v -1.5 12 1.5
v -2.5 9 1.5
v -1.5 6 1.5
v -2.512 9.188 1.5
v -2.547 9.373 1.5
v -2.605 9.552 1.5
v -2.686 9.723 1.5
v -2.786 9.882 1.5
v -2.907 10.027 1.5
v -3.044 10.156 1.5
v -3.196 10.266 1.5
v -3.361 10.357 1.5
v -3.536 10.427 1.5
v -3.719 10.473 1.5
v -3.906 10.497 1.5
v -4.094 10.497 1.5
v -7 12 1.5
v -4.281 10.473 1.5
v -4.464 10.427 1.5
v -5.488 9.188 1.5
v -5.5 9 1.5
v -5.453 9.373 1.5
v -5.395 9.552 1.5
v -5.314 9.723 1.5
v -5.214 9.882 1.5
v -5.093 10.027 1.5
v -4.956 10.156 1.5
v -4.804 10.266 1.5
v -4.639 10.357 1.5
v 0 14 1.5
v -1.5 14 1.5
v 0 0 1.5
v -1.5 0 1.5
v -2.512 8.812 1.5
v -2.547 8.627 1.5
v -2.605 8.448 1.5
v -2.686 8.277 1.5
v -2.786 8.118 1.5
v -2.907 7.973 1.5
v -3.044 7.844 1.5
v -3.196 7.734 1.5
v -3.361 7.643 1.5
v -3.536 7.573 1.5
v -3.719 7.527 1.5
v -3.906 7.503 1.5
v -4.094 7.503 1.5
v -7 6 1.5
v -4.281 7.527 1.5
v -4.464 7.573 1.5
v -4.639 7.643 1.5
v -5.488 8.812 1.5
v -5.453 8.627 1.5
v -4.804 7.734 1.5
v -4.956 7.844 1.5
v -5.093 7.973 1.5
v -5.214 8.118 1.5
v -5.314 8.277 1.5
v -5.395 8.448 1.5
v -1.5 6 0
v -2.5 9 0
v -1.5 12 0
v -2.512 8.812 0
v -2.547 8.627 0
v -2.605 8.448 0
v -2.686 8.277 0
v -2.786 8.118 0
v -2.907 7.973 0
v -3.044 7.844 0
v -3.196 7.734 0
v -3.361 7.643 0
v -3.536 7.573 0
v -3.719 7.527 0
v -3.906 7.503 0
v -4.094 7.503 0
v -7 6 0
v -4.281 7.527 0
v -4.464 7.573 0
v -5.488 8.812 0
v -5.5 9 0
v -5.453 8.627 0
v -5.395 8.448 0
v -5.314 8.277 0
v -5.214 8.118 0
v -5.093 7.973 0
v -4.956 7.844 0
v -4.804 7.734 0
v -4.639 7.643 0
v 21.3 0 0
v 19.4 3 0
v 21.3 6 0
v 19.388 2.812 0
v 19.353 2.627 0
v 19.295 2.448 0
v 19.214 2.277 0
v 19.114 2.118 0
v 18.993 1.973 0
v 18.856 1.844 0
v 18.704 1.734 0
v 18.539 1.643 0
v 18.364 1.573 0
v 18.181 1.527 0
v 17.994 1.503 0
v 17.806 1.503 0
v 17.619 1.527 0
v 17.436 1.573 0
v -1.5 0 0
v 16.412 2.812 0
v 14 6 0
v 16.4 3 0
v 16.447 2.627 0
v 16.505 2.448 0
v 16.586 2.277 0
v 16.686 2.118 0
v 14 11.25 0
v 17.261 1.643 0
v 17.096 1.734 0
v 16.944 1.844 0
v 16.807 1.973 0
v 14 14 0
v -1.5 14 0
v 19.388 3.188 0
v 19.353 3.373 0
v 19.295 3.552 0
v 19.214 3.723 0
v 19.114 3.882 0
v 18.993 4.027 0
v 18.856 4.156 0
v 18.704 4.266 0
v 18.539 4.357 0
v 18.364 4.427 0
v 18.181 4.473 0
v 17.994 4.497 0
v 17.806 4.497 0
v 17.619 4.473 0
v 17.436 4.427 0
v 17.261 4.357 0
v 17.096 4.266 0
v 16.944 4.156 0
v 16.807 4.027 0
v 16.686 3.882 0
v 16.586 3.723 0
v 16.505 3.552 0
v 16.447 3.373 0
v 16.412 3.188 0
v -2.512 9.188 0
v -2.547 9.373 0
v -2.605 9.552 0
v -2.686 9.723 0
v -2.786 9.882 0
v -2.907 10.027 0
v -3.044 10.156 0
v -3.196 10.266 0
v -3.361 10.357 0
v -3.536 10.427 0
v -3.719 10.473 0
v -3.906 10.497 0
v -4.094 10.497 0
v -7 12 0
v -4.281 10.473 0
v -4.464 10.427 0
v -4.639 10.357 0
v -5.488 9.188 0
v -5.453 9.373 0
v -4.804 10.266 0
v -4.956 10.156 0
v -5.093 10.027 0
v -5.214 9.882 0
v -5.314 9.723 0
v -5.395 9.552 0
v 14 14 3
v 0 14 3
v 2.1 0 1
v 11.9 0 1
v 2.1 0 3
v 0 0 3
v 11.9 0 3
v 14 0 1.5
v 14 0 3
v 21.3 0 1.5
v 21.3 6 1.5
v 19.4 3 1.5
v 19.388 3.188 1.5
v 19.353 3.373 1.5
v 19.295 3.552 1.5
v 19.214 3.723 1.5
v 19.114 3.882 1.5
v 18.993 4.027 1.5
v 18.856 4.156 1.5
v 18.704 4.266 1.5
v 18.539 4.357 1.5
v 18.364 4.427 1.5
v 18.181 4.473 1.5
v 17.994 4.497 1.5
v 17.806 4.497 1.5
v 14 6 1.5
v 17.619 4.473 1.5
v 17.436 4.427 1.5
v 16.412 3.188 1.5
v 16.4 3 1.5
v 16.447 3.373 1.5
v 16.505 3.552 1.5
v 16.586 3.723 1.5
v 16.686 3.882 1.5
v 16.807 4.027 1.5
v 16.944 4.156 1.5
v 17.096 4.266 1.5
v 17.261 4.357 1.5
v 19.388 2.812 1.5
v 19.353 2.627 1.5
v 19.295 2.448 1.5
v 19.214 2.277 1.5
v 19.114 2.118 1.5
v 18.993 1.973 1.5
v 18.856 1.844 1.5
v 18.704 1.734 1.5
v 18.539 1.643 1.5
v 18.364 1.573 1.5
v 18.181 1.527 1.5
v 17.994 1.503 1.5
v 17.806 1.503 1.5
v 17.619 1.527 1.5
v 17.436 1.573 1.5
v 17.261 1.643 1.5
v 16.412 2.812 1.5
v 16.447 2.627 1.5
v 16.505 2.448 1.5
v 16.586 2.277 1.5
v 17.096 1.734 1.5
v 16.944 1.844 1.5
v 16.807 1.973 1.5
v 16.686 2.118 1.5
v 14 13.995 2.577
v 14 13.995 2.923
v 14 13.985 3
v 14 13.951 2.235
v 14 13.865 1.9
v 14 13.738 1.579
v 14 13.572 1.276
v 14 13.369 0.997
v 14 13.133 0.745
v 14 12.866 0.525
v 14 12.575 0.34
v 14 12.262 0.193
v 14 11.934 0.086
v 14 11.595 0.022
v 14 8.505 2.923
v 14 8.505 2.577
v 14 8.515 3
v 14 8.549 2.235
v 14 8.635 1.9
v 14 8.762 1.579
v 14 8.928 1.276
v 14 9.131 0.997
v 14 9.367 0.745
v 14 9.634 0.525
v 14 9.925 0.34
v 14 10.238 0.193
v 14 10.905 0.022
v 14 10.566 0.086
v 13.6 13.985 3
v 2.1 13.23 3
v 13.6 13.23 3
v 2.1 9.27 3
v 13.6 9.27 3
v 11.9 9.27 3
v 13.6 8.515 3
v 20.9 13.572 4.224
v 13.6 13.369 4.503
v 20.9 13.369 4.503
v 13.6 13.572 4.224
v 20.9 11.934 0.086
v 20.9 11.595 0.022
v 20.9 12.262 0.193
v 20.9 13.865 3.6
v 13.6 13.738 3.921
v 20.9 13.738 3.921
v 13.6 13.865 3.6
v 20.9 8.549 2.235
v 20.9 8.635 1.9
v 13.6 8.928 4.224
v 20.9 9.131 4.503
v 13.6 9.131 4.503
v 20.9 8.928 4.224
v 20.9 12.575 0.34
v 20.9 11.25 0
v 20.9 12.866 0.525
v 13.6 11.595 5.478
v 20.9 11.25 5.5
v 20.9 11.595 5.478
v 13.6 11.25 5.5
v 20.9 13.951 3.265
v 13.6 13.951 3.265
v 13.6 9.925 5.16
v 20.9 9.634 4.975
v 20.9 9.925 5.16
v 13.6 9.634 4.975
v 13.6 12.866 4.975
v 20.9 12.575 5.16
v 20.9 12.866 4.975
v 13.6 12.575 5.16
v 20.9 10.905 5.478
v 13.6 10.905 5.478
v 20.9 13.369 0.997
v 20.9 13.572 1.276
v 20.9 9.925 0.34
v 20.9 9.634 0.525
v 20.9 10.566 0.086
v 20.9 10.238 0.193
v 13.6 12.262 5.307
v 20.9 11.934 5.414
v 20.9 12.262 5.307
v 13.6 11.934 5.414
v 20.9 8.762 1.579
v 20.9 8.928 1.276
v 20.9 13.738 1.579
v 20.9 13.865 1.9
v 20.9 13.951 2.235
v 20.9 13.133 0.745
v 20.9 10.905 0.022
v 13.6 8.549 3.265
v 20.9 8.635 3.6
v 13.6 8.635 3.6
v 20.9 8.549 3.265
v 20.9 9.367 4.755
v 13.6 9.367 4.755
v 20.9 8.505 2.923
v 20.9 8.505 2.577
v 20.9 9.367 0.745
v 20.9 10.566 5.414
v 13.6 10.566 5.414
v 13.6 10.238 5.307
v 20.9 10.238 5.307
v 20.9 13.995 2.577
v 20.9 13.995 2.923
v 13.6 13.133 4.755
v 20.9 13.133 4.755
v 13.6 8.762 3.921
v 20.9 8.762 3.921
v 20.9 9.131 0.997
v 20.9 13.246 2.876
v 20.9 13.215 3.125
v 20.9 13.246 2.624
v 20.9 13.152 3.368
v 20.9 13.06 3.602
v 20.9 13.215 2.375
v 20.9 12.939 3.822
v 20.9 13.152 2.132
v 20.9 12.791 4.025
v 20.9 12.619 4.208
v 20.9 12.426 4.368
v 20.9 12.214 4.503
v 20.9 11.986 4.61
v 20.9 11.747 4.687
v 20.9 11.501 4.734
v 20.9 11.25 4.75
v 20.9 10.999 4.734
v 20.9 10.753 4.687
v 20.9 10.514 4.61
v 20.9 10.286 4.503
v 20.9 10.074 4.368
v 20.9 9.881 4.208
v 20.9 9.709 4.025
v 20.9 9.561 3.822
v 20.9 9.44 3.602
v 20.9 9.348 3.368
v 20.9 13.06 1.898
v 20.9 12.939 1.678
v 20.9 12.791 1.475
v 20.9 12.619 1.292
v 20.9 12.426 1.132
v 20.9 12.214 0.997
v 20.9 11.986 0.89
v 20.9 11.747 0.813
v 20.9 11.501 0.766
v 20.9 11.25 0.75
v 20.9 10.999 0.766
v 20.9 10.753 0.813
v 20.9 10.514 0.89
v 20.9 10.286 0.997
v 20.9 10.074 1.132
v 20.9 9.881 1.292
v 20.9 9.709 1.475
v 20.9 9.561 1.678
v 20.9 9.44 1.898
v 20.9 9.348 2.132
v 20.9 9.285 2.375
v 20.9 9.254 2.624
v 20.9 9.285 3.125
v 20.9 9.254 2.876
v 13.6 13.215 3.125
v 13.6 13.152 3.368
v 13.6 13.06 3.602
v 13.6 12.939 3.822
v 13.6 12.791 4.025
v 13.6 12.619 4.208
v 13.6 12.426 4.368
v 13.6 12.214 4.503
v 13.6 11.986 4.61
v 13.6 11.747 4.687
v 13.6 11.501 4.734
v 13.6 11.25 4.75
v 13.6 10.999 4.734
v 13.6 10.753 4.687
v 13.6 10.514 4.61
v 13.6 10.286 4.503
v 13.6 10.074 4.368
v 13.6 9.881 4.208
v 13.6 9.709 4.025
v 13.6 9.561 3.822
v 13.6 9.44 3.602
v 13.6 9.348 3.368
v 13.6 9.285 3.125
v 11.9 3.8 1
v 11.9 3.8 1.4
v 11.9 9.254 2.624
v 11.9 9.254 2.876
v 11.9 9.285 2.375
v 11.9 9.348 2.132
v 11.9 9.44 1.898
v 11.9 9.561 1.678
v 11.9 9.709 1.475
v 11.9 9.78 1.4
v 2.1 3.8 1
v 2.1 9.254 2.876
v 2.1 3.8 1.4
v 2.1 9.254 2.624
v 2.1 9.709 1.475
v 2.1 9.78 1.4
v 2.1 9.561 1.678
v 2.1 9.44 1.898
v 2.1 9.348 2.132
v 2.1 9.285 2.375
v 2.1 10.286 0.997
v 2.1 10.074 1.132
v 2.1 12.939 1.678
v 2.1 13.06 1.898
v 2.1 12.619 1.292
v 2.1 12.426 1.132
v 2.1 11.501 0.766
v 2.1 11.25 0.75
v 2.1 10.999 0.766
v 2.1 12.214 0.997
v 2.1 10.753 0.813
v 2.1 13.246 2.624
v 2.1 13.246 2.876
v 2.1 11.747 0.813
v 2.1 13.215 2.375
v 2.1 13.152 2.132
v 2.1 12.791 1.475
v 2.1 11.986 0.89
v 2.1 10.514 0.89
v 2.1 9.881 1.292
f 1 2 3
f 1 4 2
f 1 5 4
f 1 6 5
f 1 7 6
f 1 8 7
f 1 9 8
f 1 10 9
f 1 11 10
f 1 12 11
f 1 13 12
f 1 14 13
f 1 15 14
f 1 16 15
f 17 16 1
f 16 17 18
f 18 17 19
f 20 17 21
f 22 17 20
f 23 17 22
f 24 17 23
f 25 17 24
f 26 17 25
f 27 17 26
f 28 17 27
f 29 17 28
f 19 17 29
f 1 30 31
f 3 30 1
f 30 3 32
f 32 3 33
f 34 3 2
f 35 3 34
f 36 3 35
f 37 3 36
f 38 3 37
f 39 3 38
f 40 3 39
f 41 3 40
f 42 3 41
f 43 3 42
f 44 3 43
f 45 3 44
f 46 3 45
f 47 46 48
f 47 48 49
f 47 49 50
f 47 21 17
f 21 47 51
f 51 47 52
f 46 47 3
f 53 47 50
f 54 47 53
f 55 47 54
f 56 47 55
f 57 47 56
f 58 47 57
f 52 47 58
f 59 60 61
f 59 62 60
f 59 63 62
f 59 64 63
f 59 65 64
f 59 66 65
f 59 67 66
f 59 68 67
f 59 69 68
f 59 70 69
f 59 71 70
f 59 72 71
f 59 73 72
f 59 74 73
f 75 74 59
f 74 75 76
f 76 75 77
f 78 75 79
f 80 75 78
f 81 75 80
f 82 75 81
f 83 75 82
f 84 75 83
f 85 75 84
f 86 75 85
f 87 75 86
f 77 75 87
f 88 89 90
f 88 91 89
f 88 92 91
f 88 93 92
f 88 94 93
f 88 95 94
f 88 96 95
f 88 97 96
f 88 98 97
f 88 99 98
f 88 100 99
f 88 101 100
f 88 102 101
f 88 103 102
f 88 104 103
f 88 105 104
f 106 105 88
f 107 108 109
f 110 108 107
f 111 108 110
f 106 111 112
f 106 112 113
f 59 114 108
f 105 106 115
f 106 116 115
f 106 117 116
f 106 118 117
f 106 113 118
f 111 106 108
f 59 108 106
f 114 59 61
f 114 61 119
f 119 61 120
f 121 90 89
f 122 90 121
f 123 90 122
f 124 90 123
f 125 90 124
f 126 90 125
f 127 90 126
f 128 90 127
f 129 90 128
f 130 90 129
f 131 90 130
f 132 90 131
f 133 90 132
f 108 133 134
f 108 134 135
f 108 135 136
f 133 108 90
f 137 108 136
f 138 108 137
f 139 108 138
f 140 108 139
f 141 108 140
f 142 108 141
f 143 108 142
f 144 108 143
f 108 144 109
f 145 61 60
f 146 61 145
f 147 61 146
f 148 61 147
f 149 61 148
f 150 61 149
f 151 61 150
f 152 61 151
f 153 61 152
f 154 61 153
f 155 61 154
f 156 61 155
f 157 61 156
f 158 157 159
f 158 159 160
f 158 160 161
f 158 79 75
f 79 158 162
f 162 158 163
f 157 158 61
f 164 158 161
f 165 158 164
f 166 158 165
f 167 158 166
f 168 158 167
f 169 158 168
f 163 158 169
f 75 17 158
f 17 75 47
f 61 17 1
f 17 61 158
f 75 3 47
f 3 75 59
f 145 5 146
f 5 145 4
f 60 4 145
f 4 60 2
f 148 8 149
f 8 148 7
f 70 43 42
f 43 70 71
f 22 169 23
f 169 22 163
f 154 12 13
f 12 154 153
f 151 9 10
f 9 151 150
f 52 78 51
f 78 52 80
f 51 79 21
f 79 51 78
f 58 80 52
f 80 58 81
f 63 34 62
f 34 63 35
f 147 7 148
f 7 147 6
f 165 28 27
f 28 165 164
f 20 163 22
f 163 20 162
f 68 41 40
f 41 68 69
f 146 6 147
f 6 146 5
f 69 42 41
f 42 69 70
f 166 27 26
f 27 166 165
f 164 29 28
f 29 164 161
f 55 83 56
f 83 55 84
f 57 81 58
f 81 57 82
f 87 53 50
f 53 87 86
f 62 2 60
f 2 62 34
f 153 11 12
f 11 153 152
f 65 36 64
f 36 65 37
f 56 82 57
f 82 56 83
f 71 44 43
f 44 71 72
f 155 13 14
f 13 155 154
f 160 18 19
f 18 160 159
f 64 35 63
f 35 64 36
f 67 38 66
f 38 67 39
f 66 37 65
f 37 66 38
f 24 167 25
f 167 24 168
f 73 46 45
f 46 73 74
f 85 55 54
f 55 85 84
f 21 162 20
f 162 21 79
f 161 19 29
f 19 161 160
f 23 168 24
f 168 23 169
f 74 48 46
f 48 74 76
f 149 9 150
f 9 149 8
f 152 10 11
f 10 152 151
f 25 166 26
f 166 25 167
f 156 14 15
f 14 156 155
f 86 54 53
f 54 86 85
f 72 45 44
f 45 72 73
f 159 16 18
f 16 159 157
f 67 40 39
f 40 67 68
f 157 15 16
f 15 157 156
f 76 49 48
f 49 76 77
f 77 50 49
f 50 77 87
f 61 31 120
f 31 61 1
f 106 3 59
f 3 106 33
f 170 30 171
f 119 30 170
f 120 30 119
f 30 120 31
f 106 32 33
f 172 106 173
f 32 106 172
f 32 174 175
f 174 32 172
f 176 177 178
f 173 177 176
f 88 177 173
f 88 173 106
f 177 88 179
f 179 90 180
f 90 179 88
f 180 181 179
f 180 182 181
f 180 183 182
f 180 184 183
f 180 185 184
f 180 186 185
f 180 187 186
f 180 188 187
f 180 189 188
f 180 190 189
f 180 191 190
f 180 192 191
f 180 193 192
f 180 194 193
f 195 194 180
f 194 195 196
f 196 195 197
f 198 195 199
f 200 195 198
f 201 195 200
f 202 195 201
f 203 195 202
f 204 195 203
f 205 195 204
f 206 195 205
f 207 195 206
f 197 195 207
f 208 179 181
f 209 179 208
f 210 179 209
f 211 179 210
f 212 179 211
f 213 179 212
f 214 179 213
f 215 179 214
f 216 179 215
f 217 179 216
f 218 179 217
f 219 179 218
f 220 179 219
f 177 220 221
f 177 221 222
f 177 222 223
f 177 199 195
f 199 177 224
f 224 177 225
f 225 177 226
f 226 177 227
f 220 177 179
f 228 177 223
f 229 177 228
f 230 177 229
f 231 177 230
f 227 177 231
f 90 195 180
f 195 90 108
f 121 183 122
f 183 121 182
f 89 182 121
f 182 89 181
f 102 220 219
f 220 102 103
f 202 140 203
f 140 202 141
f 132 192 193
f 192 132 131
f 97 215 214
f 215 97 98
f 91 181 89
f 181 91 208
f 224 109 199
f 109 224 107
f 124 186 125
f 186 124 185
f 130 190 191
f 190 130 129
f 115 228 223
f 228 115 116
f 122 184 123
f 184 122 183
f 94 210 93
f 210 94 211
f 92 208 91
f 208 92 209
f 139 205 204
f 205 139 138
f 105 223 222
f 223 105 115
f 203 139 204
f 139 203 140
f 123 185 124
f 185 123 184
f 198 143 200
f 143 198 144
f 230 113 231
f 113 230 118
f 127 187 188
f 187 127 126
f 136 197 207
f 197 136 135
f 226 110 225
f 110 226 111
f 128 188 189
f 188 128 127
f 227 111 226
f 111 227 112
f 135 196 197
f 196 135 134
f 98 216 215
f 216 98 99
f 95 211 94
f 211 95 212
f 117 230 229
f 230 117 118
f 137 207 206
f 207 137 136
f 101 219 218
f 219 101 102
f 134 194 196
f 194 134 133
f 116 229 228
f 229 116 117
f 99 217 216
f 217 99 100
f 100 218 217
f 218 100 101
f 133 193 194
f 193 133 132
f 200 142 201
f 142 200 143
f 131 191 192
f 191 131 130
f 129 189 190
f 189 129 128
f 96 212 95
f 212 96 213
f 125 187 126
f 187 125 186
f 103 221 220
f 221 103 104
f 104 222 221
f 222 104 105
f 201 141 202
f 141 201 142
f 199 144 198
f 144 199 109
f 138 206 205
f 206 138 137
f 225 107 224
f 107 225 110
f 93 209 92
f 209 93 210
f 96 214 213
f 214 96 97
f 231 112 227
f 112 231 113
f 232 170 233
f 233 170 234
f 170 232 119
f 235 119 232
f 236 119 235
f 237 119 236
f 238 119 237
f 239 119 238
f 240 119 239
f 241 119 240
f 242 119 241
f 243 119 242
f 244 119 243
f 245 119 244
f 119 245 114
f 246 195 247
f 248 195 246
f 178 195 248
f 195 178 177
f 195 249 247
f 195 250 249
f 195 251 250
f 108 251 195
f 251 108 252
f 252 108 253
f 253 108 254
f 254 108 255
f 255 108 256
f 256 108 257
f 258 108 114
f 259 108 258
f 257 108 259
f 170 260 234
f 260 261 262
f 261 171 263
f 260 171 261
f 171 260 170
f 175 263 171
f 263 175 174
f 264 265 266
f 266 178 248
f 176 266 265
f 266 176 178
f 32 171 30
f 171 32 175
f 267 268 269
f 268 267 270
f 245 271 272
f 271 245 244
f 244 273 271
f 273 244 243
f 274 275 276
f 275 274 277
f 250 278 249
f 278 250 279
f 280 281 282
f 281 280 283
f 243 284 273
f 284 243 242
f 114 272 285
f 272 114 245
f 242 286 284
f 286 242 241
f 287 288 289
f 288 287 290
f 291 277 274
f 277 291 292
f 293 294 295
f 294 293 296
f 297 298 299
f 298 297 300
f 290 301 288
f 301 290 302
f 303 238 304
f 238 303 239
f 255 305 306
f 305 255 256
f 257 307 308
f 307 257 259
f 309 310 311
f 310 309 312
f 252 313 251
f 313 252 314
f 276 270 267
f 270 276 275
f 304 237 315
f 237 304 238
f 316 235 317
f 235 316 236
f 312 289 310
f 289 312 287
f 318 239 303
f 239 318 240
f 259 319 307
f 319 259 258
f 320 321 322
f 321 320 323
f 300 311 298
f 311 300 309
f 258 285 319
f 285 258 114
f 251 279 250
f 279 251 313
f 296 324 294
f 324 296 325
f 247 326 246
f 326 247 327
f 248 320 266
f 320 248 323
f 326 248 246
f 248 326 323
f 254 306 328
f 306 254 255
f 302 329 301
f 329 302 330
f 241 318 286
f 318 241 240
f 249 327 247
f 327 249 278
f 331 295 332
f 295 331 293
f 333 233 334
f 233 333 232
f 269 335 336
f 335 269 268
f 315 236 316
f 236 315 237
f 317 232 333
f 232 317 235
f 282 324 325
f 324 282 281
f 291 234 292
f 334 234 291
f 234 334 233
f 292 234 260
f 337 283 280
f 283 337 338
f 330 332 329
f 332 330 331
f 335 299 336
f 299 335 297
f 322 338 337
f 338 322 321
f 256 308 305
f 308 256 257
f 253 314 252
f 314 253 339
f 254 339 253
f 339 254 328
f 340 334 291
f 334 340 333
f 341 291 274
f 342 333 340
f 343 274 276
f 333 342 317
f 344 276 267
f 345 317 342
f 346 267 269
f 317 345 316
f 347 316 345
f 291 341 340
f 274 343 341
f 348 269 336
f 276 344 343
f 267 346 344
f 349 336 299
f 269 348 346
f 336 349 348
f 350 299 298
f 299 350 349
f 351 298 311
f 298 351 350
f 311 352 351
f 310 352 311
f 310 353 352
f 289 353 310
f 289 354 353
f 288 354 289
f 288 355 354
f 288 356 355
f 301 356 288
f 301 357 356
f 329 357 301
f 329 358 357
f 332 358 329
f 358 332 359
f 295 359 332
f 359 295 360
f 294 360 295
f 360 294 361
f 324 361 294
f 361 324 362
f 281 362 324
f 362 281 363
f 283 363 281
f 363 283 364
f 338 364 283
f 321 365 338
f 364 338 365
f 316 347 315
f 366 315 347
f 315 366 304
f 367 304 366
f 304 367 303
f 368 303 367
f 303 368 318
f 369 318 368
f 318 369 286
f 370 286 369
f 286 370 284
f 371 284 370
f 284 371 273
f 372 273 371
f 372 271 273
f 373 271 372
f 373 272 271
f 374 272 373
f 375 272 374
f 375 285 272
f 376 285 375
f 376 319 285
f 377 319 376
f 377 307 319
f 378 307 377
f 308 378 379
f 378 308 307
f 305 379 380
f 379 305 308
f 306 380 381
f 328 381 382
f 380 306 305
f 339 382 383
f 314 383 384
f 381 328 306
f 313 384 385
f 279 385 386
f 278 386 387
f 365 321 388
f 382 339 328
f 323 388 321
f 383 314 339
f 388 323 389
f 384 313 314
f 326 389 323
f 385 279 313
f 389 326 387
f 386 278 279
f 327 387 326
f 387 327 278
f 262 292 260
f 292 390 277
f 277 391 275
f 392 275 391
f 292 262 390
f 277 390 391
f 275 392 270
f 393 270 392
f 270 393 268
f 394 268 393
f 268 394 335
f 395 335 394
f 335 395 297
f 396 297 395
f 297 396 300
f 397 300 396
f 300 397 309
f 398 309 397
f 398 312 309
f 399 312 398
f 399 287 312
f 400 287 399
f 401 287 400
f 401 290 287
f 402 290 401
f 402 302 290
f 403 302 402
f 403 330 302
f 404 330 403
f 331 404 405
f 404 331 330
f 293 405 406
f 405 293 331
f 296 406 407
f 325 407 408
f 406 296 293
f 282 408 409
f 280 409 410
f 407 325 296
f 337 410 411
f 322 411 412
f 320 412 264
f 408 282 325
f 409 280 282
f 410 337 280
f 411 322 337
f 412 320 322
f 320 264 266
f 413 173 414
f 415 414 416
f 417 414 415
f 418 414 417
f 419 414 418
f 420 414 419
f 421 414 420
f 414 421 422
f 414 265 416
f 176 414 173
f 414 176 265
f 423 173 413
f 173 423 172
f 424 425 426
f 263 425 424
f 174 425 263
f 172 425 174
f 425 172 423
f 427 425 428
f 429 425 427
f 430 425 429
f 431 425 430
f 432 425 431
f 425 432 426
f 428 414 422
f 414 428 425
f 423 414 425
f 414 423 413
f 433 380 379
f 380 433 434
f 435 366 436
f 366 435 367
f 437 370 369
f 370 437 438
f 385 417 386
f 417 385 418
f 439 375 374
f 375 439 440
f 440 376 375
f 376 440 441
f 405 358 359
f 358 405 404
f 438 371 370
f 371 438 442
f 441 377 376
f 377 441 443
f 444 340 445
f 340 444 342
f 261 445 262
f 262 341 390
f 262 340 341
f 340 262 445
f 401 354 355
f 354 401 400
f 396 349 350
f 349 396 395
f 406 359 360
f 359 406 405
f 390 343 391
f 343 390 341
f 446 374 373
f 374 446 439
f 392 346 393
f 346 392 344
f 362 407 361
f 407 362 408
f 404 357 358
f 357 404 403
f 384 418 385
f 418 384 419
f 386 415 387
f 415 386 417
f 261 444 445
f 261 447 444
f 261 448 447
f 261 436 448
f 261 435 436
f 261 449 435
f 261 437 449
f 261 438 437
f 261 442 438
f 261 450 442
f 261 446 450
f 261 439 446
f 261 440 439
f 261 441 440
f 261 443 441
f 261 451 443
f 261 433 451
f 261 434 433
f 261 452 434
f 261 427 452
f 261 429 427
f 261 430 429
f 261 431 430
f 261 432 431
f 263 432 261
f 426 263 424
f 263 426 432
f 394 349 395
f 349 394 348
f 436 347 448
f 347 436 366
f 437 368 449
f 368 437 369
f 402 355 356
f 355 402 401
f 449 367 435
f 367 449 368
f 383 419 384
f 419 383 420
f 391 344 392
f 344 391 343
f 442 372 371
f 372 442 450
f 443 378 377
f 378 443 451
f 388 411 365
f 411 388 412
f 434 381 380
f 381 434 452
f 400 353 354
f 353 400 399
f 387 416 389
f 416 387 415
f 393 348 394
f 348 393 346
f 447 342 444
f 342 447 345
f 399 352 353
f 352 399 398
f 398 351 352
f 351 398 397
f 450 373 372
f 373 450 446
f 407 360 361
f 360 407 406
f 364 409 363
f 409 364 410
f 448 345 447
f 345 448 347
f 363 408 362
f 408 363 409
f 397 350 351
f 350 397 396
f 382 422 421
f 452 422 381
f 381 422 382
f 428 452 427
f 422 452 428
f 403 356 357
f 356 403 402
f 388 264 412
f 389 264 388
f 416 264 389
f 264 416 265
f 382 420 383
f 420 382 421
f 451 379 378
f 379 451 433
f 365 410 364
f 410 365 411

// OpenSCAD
/* Ducky Shine 6 USB-C Connector Housing

   For a Ducky Shine 6 keyboard, replaces the housing used for the factory USB
   Micro-B connector. Accommodates a 9mm x 14mm JRC-B008 USB-C breakout board.
*/

$fn = 50;

mode = "bottom"; // ["top", "bottom", "both"]

fit_tolerance = 0.4;
housing_width = 14;
housing_depth = 14;
housing_height = 6;
exposed_connector = 4;
cable_insert_length = 7.3;

module top() {
  translate([0,0,housing_height / 2])
    cube([housing_width, housing_depth, housing_height / 2]);
}

module bottom() {
  lip_width = 1.5;
  tab_depth = 6;
  left_tab_width = 5.5;
  right_tab_width = 7.3;
  screw_diameter = 3;

  // Left lip + tab
  cube([housing_width, housing_depth, housing_height / 2]);
  translate([-lip_width, 0, 0]) {
    cube([lip_width + fit_tolerance, housing_depth, housing_height / 4]);

    translate([-left_tab_width, housing_depth - 2 - tab_depth, 0]) {
      difference() {
        cube([1.5 + fit_tolerance + left_tab_width, tab_depth, housing_height / 4]);
        translate([3, 3, -1])
          cylinder(h=housing_height + 2, r=screw_diameter / 2);
      }
    }

  }

  // Right tab
  translate([housing_width - fit_tolerance,0,0]) {
    difference() {
      cube([fit_tolerance + right_tab_width, tab_depth, housing_height / 4]);
      translate([right_tab_width - 3, 3, -1])
        cylinder(h=housing_height + 2, r=screw_diameter / 2);

    }
  }

}


module cable_port() {
  translate([0,2.75,2.75])
    rotate([0,90,0])
    cylinder(h=cable_insert_length, r=2.75);
}

module usb_cutout() {
  cutout_height = 3.2 + (2 * fit_tolerance);
  cutout_width = 9 + (2 * fit_tolerance);
  cutout_depth = 14 + (2 * fit_tolerance);
  connector_depth = 10.6;
  connector_lip_offset = connector_depth - exposed_connector - fit_tolerance;

  translate([(housing_width - cutout_width) / 2, 0, (housing_height - cutout_height) / 2]) {
    difference() {
      cube([cutout_width, cutout_depth, cutout_height]);
      translate([-fit_tolerance, connector_lip_offset, -fit_tolerance])
        cube([cutout_width + (fit_tolerance * 2), cutout_depth - connector_lip_offset + fit_tolerance, 0.8]);
    }
  }
}

module cable_port_cutout() {
  usb_cutout_width = 9 + (2 * fit_tolerance);
  usb_cutout_offset = (housing_width - usb_cutout_width) / 2;
  cutout_length = usb_cutout_width + usb_cutout_offset;
  translate([-cutout_length + fit_tolerance, 2.75, 2.75])
    rotate([0,90,0])
    cylinder(h=cutout_length + cable_insert_length, r=2);
}

difference() {
  union() {
    if (mode == "top" || mode == "both")
      top();
    if (mode == "bottom" || mode == "both") {
      bottom();
      translate([housing_width - fit_tolerance,housing_depth - 5.5,0])
        cable_port();
    }
  }
  union () {
    translate([0, -(2 + fit_tolerance), 0])
      usb_cutout();
    translate([housing_width - fit_tolerance, housing_depth - 5.5, 0])
      cable_port_cutout();
  }
}
